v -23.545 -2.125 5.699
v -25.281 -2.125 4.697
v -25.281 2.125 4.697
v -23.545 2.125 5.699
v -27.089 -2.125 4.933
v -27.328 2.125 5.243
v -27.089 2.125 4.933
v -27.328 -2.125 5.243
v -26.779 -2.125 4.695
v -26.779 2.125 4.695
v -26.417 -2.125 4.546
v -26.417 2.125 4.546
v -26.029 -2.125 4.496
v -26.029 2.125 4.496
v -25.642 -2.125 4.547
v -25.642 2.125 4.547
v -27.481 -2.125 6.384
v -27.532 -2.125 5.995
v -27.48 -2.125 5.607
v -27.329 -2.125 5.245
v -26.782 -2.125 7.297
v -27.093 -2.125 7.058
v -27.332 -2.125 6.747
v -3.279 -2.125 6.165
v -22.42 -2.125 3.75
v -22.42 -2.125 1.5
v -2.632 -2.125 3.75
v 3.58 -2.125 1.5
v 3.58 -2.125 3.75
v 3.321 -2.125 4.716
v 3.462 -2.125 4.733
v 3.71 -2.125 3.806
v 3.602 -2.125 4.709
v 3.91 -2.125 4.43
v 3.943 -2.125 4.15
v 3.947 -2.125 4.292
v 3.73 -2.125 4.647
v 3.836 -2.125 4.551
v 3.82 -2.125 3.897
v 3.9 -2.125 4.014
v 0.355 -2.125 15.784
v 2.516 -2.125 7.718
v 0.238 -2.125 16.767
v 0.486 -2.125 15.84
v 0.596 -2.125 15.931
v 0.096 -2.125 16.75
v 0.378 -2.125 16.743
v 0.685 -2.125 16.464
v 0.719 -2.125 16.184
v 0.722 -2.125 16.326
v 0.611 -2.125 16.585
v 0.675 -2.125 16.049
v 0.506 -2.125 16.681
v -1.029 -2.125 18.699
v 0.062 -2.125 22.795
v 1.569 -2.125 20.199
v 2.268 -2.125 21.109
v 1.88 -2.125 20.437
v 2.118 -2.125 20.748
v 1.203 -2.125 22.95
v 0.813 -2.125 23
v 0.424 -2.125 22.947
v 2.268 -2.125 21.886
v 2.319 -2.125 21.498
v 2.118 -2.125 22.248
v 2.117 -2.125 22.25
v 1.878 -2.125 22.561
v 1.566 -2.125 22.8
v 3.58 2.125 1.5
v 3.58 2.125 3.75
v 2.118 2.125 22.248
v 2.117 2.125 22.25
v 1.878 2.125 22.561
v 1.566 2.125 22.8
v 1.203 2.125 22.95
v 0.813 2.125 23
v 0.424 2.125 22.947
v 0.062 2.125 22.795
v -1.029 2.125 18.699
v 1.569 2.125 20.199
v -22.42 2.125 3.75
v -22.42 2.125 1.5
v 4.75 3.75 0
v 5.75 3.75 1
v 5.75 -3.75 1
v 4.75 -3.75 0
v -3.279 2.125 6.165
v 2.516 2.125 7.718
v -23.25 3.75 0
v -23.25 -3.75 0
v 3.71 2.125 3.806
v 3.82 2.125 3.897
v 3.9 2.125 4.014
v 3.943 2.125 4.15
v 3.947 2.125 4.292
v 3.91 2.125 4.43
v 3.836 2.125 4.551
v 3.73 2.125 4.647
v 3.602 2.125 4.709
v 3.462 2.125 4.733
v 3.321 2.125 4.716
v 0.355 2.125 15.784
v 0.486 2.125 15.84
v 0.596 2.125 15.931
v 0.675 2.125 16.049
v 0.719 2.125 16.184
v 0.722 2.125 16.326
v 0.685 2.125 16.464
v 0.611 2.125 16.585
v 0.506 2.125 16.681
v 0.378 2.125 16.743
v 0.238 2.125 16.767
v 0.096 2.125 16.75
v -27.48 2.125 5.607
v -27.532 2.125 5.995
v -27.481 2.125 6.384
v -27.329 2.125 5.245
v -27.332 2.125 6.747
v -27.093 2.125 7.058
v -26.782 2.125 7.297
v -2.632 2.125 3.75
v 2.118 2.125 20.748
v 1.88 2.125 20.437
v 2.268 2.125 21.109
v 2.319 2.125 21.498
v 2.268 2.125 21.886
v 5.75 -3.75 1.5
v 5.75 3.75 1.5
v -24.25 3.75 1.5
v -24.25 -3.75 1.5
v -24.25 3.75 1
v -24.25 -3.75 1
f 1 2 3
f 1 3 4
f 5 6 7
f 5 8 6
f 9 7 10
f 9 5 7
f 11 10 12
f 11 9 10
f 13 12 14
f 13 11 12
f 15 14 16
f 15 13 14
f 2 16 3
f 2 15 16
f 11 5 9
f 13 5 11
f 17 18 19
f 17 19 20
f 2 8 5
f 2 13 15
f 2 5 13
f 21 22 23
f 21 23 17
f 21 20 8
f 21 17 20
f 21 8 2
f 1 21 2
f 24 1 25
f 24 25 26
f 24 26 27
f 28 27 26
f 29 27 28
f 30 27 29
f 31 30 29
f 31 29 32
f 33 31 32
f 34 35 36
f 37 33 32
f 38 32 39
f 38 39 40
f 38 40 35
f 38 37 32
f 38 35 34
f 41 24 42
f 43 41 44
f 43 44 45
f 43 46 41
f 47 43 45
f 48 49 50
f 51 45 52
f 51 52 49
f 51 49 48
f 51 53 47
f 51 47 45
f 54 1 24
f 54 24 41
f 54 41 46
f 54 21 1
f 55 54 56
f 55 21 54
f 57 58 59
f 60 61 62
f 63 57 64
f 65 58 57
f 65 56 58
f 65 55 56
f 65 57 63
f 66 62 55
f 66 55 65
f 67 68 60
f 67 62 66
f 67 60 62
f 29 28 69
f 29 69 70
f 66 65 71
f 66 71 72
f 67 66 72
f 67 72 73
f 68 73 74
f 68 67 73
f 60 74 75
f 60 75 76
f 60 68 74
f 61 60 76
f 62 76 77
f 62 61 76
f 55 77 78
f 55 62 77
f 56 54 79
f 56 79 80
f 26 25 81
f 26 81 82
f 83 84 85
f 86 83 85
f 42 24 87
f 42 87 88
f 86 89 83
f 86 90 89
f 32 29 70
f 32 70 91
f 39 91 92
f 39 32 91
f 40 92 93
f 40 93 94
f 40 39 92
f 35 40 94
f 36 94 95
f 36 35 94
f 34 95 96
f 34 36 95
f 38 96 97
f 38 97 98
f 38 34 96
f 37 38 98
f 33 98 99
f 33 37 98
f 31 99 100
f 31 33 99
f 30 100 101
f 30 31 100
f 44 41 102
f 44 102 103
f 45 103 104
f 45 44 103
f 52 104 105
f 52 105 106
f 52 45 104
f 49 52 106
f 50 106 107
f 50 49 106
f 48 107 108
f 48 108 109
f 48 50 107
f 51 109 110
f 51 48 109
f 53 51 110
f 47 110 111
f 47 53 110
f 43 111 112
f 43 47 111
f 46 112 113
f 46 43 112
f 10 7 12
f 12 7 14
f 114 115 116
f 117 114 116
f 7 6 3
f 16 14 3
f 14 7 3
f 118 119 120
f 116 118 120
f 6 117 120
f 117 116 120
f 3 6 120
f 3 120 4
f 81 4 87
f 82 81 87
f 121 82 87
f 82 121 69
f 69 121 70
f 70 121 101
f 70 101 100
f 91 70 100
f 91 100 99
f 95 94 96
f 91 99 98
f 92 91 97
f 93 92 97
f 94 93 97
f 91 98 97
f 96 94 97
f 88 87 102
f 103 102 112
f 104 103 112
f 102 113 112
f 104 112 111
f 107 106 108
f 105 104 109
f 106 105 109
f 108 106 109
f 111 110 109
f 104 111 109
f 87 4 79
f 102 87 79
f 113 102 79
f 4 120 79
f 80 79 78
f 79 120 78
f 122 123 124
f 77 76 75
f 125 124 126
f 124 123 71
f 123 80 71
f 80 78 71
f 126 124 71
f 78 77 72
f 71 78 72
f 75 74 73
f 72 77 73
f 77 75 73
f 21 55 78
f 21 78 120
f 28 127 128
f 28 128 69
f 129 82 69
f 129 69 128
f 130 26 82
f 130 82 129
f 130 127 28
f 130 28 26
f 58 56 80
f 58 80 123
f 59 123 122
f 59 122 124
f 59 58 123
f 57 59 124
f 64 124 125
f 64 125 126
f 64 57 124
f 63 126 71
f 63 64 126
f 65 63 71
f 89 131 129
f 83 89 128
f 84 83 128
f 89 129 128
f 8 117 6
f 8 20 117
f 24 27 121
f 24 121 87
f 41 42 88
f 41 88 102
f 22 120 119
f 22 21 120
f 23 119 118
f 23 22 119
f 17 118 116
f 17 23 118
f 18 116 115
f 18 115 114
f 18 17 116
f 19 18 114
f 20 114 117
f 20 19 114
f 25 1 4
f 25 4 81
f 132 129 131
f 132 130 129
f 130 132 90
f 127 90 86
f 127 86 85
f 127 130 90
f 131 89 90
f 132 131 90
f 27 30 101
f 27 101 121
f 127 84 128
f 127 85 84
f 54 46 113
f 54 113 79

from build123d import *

# Parameters (mm, degrees)
F1_DEPTH = 3.75
F2_DEPTH = 2.125
F3_SIZE  = 1


# Not quite as in the source:
# - a feature names something its author has since deleted; it is built from what else it names


with BuildPart() as f1:
    # F0 (on Front) → F1 (new body, symmetric)
    with BuildSketch(Plane.XZ):
        Polygon((-22.420435602, 1.5), (-24.2496415957, 1.5), (-24.2496415957, 0), (5.7503584043, 0), (5.7503584043, 1.5), (3.579564398, 1.5), align=None)
    extrude(amount=F1_DEPTH, both=True)

    # F0 (on Front) → F2 (join, symmetric)
    with BuildSketch(Plane.XZ):
        with BuildLine():
            Line((-23.545435602, 5.6985571585), (-22.420435602, 3.75))
            Line((-22.420435602, 3.75), (0.0962248963, 16.75))
            Line((0.0962248963, 16.75), (-1.0287751037, 18.6985571585))
            Line((-1.0287751037, 18.6985571585), (1.5693069281, 20.1985605189))
            ThreePointArc((1.5693069281, 20.1985605189), (2.2681808156, 21.1093697133), (2.1183275727, 22.2475885433))
            Line((2.1183275727, 22.2475885433), (2.117101021, 22.2497129931))
            ThreePointArc((2.117101021, 22.2497129931), (1.2027410199, 22.9495484169), (0.0617075083, 22.7950610152))
            Line((0.0617075083, 22.7950610152), (-26.7819009783, 7.2968964295))
            ThreePointArc((-26.7819009783, 7.2968964295), (-27.4812661607, 6.3843043976), (-27.329090085, 5.2446648418))
            Line((-27.329090085, 5.2446648418), (-27.3278673466, 5.242558978))
            ThreePointArc((-27.3278673466, 5.242558978), (-26.4171243137, 4.5463872777), (-25.2806782399, 4.6967143544))
            Line((-25.2806782399, 4.6967143544), (-23.545435602, 5.6985571585))
        make_face()
        Polygon((0.0962248963, 16.75), (-22.420435602, 3.75), (-2.6320926845, 3.75), (-3.2791402973, 6.1648145657), (2.5164146605, 7.7177288363), (0.3550439415, 15.7840741737), align=None)
        Polygon((-22.420435602, 3.75), (-22.420435602, 1.5), (3.579564398, 1.5), (3.579564398, 3.75), (-2.6320926845, 3.75), align=None)
        Polygon((-2.6320926845, 3.75), (3.579564398, 3.75), (3.3207453529, 4.7159258263), align=None)
        with BuildLine():
            Line((3.3207453529, 4.7159258263), (3.579564398, 3.75))
            ThreePointArc((3.579564398, 3.75), (3.9331177885, 4.3623724357), (3.3207453529, 4.7159258263))
        make_face()
        with BuildLine():
            ThreePointArc((0.3550439415, 15.7840741737), (0.708597332, 16.3964466094), (0.0962248963, 16.75))
            Line((0.0962248963, 16.75), (0.3550439415, 15.7840741737))
        make_face()
    extrude(amount=F2_DEPTH, both=True)

    # F3
    f3_edges = [f1.edges().sort_by_distance(p)[0] for p in [
        (-24.249642, 0, 0),
        (5.750358, 0, 0),
    ]]
    chamfer(f3_edges, length=F3_SIZE)


solid = f1.part
